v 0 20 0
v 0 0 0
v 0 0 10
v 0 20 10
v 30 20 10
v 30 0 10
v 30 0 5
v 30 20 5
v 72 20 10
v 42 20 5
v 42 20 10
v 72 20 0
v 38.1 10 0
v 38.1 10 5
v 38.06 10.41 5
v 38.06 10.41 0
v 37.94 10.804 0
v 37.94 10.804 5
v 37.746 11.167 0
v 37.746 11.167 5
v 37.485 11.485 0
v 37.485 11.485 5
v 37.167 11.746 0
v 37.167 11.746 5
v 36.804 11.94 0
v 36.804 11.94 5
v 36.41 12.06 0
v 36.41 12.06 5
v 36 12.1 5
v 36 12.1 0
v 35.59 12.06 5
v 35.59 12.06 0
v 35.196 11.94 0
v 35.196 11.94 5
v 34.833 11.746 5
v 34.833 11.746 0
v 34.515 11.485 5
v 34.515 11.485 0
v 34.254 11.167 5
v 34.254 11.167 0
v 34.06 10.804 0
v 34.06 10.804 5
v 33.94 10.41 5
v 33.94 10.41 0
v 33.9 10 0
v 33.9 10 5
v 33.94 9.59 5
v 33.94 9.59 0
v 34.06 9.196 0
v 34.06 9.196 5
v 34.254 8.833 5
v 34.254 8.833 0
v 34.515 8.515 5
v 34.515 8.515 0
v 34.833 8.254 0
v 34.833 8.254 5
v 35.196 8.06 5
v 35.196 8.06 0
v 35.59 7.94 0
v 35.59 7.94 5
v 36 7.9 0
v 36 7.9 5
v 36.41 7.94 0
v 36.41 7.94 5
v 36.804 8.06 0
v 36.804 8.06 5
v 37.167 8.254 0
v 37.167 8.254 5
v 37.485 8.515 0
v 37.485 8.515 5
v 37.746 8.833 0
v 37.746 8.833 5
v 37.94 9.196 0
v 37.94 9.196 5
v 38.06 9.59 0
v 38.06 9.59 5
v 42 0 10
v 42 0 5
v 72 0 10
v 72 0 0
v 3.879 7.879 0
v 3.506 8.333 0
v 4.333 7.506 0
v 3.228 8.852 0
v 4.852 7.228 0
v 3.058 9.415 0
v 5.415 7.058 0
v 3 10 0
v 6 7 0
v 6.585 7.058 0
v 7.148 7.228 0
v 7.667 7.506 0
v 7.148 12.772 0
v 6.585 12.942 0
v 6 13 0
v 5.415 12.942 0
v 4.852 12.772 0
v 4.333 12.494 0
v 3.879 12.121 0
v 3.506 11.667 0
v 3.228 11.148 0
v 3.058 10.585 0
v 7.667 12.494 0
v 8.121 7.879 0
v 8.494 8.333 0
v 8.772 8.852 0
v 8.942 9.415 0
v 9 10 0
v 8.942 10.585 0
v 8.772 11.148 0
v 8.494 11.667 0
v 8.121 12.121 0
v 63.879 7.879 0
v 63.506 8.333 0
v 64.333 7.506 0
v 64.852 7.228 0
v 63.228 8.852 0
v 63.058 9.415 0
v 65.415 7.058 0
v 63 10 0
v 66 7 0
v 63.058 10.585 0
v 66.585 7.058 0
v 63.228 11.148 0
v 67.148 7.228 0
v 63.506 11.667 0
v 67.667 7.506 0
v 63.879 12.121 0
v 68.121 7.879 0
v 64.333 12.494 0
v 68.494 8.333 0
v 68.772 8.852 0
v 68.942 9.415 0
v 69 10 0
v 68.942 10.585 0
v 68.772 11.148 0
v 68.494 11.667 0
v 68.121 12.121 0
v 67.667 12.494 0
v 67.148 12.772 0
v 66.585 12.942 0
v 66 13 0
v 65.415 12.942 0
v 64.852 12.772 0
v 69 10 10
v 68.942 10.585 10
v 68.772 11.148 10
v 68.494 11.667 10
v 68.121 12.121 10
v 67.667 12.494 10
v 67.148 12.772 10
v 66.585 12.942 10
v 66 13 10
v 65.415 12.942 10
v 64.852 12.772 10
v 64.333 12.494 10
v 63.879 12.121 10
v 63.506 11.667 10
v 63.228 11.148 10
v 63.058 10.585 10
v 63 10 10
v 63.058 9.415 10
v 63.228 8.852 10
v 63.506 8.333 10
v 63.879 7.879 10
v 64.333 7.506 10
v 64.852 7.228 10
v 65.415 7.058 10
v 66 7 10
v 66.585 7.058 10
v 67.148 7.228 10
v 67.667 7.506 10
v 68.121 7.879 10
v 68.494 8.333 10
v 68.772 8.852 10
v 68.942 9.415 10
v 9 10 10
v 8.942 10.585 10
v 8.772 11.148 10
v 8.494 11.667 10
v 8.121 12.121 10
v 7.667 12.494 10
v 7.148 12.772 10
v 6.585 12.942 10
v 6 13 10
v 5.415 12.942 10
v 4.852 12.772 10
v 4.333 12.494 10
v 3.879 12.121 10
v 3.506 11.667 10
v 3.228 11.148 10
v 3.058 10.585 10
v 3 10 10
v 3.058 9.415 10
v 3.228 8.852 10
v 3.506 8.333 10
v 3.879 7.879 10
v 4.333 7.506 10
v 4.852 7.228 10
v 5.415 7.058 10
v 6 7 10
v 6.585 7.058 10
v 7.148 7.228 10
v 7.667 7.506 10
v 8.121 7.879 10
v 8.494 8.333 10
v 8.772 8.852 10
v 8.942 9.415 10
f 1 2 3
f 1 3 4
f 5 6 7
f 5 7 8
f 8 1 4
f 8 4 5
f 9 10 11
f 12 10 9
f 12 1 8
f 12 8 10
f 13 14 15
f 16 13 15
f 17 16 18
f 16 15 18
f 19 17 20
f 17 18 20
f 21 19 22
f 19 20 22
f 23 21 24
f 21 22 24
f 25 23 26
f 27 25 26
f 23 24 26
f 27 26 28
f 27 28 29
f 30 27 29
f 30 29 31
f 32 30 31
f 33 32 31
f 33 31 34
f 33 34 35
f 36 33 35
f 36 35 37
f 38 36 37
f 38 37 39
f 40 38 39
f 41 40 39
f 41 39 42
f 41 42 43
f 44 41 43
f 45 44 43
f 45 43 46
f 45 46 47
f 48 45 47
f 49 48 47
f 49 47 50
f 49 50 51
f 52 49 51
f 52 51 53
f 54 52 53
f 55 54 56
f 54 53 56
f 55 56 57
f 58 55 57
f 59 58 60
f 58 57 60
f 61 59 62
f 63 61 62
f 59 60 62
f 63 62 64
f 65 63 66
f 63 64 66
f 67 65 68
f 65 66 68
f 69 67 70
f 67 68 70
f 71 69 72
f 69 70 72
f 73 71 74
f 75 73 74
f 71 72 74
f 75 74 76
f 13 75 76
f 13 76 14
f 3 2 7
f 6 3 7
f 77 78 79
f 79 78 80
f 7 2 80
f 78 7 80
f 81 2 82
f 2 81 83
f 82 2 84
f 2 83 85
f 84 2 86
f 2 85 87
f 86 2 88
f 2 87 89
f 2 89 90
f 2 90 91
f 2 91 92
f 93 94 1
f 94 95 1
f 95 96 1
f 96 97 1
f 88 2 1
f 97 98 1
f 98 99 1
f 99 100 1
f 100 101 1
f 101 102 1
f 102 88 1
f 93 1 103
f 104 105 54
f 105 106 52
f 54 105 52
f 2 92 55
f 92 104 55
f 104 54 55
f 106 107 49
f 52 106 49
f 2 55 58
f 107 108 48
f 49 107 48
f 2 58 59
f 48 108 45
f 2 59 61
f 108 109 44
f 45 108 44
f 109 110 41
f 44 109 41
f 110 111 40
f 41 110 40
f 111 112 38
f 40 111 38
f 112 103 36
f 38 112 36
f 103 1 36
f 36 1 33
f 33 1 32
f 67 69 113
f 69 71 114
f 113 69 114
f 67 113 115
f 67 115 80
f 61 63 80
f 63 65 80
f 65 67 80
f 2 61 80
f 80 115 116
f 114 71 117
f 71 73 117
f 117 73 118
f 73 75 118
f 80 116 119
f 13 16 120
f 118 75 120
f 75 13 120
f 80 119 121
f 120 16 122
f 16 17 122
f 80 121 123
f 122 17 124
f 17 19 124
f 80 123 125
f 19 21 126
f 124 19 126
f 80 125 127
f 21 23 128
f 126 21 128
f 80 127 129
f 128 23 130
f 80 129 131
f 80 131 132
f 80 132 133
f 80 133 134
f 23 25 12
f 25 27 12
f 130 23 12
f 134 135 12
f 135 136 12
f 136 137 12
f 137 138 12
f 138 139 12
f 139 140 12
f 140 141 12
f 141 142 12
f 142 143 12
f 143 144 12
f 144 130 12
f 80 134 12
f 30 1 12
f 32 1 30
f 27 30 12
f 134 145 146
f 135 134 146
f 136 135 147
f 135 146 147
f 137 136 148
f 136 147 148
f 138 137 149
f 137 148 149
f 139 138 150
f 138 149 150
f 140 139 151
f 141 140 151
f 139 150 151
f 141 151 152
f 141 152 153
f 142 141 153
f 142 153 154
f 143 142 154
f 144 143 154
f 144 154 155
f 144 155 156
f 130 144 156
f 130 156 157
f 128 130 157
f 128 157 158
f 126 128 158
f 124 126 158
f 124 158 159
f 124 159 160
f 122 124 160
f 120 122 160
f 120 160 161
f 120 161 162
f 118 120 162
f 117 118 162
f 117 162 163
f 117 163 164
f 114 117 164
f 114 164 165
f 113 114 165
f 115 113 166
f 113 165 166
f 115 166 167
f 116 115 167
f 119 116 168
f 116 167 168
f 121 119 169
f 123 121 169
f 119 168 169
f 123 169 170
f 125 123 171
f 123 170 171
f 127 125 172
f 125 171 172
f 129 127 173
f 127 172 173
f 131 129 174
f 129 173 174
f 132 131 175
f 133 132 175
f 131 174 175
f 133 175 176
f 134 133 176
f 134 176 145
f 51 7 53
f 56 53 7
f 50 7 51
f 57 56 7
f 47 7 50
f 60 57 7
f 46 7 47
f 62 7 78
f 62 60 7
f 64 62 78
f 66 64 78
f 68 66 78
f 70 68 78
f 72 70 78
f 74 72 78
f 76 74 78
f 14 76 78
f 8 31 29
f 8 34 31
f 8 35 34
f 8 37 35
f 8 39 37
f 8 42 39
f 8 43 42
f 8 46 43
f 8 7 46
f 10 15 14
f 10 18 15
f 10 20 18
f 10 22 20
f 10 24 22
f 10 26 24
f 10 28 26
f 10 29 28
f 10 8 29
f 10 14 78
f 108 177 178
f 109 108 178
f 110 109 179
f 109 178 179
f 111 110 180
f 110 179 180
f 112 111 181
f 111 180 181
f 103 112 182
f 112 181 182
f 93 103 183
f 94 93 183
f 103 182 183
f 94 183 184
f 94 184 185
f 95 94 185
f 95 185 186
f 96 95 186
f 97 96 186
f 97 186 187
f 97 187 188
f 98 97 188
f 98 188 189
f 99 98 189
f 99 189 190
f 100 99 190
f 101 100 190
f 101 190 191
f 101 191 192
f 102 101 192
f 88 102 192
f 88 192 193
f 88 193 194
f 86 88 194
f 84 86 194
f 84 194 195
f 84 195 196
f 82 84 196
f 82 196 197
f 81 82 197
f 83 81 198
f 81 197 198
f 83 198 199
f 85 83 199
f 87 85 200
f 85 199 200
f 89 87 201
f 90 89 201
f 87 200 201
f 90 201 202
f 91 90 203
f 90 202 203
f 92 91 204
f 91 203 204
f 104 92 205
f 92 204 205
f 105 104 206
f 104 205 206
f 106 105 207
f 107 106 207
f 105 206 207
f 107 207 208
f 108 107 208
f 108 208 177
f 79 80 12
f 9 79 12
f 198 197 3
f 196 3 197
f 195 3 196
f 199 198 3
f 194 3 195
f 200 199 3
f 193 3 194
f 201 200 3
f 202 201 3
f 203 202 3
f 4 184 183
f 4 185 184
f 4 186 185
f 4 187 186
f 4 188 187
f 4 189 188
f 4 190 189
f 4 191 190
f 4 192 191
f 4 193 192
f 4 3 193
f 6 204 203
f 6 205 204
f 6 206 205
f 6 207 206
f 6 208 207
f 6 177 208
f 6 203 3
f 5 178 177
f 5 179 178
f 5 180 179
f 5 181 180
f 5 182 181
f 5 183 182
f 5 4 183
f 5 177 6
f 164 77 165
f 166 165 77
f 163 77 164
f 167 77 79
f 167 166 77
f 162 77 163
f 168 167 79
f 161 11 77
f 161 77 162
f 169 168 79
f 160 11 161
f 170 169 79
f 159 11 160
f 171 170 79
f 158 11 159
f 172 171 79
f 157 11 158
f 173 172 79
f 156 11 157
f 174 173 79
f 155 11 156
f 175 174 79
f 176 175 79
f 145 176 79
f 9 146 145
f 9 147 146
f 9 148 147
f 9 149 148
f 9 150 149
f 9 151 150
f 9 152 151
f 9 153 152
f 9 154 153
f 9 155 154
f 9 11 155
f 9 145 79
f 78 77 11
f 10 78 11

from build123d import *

# Parameters (mm, degrees)
F0_W     = 72
F0_H     = 20
F1_DEPTH = 10
F2_W     = 12
F2_H     = 20
F3_DEPTH = 5
F4_R     = 3
F4_R_2   = 2.1
F5_DEPTH = 25


with BuildPart() as f1:
    # F0 (on Top) → F1 (new body)
    with BuildSketch(Plane.XY):
        with Locations((36, 10)):
            Rectangle(F0_W, F0_H)
    extrude(amount=F1_DEPTH)

    # F2 (on face) → F3 (cut)
    with BuildSketch(Plane.XY.offset(10)):
        with Locations((36, 10)):
            Rectangle(F2_W, F2_H)
    extrude(amount=-F3_DEPTH, mode=Mode.SUBTRACT)

    # F4 (on face) → F5 (cut)
    with BuildSketch(Plane.XY.offset(10)):
        with Locations((6, 10)):
            Circle(F4_R)
        with Locations((66, 10)):
            Circle(F4_R)
        with Locations((36, 10)):
            Circle(F4_R_2)
    extrude(amount=-F5_DEPTH, mode=Mode.SUBTRACT)


solid = f1.part
